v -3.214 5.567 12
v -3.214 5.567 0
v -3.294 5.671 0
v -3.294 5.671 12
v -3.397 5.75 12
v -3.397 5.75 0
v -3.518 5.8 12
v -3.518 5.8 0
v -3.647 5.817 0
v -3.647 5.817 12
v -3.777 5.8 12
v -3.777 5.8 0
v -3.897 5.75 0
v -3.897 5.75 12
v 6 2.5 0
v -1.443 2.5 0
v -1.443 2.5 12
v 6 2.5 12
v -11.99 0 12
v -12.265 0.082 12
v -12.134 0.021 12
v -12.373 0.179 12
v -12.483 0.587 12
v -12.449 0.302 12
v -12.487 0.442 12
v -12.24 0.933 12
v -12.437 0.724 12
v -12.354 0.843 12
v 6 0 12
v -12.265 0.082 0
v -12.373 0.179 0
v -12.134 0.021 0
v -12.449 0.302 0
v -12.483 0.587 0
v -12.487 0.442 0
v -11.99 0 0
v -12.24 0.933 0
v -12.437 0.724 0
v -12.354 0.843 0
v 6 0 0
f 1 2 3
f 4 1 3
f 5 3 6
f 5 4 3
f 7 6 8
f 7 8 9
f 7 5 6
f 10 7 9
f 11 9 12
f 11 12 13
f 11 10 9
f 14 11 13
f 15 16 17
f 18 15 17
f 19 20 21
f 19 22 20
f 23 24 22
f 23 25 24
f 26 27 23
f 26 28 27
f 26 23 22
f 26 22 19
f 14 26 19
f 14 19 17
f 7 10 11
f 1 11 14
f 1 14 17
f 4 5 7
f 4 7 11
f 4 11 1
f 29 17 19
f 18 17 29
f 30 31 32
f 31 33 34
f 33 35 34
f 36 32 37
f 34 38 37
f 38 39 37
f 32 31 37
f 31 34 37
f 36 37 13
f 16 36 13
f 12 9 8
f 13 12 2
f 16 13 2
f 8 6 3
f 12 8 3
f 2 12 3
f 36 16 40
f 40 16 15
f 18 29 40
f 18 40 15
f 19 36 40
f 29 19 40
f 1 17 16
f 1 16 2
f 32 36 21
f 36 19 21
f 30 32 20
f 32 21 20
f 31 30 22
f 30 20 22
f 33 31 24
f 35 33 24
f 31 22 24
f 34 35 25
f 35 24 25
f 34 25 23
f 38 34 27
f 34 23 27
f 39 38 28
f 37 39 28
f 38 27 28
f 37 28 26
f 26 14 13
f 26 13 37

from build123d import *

# Parameters (mm, degrees)
F1_DEPTH = 12
F3_W     = 2.5
F3_H     = 12
F4_DEPTH = 9.464
F5_R     = 0.5


with BuildPart() as f1:
    # F0 (on Top) → F1 (new body)
    with BuildSketch(Plane.XY):
        Polygon((-13.856406, 0), (0, 0), (-3.464102, 6), align=None)
    extrude(amount=F1_DEPTH)

    # F3 (on offset) → F4 (join)
    with BuildSketch(Plane.YZ.offset(-3.4643)):
        with Locations((1.25, 6)):
            Rectangle(F3_W, F3_H)
    extrude(amount=F4_DEPTH)

    # F5
    f5_edges = [f1.edges().sort_by_distance(p)[0] for p in [
        (-3.464102, 6, 6),
        (-13.856406, 0, 6),
    ]]
    fillet(f5_edges, radius=F5_R)


solid = f1.part
